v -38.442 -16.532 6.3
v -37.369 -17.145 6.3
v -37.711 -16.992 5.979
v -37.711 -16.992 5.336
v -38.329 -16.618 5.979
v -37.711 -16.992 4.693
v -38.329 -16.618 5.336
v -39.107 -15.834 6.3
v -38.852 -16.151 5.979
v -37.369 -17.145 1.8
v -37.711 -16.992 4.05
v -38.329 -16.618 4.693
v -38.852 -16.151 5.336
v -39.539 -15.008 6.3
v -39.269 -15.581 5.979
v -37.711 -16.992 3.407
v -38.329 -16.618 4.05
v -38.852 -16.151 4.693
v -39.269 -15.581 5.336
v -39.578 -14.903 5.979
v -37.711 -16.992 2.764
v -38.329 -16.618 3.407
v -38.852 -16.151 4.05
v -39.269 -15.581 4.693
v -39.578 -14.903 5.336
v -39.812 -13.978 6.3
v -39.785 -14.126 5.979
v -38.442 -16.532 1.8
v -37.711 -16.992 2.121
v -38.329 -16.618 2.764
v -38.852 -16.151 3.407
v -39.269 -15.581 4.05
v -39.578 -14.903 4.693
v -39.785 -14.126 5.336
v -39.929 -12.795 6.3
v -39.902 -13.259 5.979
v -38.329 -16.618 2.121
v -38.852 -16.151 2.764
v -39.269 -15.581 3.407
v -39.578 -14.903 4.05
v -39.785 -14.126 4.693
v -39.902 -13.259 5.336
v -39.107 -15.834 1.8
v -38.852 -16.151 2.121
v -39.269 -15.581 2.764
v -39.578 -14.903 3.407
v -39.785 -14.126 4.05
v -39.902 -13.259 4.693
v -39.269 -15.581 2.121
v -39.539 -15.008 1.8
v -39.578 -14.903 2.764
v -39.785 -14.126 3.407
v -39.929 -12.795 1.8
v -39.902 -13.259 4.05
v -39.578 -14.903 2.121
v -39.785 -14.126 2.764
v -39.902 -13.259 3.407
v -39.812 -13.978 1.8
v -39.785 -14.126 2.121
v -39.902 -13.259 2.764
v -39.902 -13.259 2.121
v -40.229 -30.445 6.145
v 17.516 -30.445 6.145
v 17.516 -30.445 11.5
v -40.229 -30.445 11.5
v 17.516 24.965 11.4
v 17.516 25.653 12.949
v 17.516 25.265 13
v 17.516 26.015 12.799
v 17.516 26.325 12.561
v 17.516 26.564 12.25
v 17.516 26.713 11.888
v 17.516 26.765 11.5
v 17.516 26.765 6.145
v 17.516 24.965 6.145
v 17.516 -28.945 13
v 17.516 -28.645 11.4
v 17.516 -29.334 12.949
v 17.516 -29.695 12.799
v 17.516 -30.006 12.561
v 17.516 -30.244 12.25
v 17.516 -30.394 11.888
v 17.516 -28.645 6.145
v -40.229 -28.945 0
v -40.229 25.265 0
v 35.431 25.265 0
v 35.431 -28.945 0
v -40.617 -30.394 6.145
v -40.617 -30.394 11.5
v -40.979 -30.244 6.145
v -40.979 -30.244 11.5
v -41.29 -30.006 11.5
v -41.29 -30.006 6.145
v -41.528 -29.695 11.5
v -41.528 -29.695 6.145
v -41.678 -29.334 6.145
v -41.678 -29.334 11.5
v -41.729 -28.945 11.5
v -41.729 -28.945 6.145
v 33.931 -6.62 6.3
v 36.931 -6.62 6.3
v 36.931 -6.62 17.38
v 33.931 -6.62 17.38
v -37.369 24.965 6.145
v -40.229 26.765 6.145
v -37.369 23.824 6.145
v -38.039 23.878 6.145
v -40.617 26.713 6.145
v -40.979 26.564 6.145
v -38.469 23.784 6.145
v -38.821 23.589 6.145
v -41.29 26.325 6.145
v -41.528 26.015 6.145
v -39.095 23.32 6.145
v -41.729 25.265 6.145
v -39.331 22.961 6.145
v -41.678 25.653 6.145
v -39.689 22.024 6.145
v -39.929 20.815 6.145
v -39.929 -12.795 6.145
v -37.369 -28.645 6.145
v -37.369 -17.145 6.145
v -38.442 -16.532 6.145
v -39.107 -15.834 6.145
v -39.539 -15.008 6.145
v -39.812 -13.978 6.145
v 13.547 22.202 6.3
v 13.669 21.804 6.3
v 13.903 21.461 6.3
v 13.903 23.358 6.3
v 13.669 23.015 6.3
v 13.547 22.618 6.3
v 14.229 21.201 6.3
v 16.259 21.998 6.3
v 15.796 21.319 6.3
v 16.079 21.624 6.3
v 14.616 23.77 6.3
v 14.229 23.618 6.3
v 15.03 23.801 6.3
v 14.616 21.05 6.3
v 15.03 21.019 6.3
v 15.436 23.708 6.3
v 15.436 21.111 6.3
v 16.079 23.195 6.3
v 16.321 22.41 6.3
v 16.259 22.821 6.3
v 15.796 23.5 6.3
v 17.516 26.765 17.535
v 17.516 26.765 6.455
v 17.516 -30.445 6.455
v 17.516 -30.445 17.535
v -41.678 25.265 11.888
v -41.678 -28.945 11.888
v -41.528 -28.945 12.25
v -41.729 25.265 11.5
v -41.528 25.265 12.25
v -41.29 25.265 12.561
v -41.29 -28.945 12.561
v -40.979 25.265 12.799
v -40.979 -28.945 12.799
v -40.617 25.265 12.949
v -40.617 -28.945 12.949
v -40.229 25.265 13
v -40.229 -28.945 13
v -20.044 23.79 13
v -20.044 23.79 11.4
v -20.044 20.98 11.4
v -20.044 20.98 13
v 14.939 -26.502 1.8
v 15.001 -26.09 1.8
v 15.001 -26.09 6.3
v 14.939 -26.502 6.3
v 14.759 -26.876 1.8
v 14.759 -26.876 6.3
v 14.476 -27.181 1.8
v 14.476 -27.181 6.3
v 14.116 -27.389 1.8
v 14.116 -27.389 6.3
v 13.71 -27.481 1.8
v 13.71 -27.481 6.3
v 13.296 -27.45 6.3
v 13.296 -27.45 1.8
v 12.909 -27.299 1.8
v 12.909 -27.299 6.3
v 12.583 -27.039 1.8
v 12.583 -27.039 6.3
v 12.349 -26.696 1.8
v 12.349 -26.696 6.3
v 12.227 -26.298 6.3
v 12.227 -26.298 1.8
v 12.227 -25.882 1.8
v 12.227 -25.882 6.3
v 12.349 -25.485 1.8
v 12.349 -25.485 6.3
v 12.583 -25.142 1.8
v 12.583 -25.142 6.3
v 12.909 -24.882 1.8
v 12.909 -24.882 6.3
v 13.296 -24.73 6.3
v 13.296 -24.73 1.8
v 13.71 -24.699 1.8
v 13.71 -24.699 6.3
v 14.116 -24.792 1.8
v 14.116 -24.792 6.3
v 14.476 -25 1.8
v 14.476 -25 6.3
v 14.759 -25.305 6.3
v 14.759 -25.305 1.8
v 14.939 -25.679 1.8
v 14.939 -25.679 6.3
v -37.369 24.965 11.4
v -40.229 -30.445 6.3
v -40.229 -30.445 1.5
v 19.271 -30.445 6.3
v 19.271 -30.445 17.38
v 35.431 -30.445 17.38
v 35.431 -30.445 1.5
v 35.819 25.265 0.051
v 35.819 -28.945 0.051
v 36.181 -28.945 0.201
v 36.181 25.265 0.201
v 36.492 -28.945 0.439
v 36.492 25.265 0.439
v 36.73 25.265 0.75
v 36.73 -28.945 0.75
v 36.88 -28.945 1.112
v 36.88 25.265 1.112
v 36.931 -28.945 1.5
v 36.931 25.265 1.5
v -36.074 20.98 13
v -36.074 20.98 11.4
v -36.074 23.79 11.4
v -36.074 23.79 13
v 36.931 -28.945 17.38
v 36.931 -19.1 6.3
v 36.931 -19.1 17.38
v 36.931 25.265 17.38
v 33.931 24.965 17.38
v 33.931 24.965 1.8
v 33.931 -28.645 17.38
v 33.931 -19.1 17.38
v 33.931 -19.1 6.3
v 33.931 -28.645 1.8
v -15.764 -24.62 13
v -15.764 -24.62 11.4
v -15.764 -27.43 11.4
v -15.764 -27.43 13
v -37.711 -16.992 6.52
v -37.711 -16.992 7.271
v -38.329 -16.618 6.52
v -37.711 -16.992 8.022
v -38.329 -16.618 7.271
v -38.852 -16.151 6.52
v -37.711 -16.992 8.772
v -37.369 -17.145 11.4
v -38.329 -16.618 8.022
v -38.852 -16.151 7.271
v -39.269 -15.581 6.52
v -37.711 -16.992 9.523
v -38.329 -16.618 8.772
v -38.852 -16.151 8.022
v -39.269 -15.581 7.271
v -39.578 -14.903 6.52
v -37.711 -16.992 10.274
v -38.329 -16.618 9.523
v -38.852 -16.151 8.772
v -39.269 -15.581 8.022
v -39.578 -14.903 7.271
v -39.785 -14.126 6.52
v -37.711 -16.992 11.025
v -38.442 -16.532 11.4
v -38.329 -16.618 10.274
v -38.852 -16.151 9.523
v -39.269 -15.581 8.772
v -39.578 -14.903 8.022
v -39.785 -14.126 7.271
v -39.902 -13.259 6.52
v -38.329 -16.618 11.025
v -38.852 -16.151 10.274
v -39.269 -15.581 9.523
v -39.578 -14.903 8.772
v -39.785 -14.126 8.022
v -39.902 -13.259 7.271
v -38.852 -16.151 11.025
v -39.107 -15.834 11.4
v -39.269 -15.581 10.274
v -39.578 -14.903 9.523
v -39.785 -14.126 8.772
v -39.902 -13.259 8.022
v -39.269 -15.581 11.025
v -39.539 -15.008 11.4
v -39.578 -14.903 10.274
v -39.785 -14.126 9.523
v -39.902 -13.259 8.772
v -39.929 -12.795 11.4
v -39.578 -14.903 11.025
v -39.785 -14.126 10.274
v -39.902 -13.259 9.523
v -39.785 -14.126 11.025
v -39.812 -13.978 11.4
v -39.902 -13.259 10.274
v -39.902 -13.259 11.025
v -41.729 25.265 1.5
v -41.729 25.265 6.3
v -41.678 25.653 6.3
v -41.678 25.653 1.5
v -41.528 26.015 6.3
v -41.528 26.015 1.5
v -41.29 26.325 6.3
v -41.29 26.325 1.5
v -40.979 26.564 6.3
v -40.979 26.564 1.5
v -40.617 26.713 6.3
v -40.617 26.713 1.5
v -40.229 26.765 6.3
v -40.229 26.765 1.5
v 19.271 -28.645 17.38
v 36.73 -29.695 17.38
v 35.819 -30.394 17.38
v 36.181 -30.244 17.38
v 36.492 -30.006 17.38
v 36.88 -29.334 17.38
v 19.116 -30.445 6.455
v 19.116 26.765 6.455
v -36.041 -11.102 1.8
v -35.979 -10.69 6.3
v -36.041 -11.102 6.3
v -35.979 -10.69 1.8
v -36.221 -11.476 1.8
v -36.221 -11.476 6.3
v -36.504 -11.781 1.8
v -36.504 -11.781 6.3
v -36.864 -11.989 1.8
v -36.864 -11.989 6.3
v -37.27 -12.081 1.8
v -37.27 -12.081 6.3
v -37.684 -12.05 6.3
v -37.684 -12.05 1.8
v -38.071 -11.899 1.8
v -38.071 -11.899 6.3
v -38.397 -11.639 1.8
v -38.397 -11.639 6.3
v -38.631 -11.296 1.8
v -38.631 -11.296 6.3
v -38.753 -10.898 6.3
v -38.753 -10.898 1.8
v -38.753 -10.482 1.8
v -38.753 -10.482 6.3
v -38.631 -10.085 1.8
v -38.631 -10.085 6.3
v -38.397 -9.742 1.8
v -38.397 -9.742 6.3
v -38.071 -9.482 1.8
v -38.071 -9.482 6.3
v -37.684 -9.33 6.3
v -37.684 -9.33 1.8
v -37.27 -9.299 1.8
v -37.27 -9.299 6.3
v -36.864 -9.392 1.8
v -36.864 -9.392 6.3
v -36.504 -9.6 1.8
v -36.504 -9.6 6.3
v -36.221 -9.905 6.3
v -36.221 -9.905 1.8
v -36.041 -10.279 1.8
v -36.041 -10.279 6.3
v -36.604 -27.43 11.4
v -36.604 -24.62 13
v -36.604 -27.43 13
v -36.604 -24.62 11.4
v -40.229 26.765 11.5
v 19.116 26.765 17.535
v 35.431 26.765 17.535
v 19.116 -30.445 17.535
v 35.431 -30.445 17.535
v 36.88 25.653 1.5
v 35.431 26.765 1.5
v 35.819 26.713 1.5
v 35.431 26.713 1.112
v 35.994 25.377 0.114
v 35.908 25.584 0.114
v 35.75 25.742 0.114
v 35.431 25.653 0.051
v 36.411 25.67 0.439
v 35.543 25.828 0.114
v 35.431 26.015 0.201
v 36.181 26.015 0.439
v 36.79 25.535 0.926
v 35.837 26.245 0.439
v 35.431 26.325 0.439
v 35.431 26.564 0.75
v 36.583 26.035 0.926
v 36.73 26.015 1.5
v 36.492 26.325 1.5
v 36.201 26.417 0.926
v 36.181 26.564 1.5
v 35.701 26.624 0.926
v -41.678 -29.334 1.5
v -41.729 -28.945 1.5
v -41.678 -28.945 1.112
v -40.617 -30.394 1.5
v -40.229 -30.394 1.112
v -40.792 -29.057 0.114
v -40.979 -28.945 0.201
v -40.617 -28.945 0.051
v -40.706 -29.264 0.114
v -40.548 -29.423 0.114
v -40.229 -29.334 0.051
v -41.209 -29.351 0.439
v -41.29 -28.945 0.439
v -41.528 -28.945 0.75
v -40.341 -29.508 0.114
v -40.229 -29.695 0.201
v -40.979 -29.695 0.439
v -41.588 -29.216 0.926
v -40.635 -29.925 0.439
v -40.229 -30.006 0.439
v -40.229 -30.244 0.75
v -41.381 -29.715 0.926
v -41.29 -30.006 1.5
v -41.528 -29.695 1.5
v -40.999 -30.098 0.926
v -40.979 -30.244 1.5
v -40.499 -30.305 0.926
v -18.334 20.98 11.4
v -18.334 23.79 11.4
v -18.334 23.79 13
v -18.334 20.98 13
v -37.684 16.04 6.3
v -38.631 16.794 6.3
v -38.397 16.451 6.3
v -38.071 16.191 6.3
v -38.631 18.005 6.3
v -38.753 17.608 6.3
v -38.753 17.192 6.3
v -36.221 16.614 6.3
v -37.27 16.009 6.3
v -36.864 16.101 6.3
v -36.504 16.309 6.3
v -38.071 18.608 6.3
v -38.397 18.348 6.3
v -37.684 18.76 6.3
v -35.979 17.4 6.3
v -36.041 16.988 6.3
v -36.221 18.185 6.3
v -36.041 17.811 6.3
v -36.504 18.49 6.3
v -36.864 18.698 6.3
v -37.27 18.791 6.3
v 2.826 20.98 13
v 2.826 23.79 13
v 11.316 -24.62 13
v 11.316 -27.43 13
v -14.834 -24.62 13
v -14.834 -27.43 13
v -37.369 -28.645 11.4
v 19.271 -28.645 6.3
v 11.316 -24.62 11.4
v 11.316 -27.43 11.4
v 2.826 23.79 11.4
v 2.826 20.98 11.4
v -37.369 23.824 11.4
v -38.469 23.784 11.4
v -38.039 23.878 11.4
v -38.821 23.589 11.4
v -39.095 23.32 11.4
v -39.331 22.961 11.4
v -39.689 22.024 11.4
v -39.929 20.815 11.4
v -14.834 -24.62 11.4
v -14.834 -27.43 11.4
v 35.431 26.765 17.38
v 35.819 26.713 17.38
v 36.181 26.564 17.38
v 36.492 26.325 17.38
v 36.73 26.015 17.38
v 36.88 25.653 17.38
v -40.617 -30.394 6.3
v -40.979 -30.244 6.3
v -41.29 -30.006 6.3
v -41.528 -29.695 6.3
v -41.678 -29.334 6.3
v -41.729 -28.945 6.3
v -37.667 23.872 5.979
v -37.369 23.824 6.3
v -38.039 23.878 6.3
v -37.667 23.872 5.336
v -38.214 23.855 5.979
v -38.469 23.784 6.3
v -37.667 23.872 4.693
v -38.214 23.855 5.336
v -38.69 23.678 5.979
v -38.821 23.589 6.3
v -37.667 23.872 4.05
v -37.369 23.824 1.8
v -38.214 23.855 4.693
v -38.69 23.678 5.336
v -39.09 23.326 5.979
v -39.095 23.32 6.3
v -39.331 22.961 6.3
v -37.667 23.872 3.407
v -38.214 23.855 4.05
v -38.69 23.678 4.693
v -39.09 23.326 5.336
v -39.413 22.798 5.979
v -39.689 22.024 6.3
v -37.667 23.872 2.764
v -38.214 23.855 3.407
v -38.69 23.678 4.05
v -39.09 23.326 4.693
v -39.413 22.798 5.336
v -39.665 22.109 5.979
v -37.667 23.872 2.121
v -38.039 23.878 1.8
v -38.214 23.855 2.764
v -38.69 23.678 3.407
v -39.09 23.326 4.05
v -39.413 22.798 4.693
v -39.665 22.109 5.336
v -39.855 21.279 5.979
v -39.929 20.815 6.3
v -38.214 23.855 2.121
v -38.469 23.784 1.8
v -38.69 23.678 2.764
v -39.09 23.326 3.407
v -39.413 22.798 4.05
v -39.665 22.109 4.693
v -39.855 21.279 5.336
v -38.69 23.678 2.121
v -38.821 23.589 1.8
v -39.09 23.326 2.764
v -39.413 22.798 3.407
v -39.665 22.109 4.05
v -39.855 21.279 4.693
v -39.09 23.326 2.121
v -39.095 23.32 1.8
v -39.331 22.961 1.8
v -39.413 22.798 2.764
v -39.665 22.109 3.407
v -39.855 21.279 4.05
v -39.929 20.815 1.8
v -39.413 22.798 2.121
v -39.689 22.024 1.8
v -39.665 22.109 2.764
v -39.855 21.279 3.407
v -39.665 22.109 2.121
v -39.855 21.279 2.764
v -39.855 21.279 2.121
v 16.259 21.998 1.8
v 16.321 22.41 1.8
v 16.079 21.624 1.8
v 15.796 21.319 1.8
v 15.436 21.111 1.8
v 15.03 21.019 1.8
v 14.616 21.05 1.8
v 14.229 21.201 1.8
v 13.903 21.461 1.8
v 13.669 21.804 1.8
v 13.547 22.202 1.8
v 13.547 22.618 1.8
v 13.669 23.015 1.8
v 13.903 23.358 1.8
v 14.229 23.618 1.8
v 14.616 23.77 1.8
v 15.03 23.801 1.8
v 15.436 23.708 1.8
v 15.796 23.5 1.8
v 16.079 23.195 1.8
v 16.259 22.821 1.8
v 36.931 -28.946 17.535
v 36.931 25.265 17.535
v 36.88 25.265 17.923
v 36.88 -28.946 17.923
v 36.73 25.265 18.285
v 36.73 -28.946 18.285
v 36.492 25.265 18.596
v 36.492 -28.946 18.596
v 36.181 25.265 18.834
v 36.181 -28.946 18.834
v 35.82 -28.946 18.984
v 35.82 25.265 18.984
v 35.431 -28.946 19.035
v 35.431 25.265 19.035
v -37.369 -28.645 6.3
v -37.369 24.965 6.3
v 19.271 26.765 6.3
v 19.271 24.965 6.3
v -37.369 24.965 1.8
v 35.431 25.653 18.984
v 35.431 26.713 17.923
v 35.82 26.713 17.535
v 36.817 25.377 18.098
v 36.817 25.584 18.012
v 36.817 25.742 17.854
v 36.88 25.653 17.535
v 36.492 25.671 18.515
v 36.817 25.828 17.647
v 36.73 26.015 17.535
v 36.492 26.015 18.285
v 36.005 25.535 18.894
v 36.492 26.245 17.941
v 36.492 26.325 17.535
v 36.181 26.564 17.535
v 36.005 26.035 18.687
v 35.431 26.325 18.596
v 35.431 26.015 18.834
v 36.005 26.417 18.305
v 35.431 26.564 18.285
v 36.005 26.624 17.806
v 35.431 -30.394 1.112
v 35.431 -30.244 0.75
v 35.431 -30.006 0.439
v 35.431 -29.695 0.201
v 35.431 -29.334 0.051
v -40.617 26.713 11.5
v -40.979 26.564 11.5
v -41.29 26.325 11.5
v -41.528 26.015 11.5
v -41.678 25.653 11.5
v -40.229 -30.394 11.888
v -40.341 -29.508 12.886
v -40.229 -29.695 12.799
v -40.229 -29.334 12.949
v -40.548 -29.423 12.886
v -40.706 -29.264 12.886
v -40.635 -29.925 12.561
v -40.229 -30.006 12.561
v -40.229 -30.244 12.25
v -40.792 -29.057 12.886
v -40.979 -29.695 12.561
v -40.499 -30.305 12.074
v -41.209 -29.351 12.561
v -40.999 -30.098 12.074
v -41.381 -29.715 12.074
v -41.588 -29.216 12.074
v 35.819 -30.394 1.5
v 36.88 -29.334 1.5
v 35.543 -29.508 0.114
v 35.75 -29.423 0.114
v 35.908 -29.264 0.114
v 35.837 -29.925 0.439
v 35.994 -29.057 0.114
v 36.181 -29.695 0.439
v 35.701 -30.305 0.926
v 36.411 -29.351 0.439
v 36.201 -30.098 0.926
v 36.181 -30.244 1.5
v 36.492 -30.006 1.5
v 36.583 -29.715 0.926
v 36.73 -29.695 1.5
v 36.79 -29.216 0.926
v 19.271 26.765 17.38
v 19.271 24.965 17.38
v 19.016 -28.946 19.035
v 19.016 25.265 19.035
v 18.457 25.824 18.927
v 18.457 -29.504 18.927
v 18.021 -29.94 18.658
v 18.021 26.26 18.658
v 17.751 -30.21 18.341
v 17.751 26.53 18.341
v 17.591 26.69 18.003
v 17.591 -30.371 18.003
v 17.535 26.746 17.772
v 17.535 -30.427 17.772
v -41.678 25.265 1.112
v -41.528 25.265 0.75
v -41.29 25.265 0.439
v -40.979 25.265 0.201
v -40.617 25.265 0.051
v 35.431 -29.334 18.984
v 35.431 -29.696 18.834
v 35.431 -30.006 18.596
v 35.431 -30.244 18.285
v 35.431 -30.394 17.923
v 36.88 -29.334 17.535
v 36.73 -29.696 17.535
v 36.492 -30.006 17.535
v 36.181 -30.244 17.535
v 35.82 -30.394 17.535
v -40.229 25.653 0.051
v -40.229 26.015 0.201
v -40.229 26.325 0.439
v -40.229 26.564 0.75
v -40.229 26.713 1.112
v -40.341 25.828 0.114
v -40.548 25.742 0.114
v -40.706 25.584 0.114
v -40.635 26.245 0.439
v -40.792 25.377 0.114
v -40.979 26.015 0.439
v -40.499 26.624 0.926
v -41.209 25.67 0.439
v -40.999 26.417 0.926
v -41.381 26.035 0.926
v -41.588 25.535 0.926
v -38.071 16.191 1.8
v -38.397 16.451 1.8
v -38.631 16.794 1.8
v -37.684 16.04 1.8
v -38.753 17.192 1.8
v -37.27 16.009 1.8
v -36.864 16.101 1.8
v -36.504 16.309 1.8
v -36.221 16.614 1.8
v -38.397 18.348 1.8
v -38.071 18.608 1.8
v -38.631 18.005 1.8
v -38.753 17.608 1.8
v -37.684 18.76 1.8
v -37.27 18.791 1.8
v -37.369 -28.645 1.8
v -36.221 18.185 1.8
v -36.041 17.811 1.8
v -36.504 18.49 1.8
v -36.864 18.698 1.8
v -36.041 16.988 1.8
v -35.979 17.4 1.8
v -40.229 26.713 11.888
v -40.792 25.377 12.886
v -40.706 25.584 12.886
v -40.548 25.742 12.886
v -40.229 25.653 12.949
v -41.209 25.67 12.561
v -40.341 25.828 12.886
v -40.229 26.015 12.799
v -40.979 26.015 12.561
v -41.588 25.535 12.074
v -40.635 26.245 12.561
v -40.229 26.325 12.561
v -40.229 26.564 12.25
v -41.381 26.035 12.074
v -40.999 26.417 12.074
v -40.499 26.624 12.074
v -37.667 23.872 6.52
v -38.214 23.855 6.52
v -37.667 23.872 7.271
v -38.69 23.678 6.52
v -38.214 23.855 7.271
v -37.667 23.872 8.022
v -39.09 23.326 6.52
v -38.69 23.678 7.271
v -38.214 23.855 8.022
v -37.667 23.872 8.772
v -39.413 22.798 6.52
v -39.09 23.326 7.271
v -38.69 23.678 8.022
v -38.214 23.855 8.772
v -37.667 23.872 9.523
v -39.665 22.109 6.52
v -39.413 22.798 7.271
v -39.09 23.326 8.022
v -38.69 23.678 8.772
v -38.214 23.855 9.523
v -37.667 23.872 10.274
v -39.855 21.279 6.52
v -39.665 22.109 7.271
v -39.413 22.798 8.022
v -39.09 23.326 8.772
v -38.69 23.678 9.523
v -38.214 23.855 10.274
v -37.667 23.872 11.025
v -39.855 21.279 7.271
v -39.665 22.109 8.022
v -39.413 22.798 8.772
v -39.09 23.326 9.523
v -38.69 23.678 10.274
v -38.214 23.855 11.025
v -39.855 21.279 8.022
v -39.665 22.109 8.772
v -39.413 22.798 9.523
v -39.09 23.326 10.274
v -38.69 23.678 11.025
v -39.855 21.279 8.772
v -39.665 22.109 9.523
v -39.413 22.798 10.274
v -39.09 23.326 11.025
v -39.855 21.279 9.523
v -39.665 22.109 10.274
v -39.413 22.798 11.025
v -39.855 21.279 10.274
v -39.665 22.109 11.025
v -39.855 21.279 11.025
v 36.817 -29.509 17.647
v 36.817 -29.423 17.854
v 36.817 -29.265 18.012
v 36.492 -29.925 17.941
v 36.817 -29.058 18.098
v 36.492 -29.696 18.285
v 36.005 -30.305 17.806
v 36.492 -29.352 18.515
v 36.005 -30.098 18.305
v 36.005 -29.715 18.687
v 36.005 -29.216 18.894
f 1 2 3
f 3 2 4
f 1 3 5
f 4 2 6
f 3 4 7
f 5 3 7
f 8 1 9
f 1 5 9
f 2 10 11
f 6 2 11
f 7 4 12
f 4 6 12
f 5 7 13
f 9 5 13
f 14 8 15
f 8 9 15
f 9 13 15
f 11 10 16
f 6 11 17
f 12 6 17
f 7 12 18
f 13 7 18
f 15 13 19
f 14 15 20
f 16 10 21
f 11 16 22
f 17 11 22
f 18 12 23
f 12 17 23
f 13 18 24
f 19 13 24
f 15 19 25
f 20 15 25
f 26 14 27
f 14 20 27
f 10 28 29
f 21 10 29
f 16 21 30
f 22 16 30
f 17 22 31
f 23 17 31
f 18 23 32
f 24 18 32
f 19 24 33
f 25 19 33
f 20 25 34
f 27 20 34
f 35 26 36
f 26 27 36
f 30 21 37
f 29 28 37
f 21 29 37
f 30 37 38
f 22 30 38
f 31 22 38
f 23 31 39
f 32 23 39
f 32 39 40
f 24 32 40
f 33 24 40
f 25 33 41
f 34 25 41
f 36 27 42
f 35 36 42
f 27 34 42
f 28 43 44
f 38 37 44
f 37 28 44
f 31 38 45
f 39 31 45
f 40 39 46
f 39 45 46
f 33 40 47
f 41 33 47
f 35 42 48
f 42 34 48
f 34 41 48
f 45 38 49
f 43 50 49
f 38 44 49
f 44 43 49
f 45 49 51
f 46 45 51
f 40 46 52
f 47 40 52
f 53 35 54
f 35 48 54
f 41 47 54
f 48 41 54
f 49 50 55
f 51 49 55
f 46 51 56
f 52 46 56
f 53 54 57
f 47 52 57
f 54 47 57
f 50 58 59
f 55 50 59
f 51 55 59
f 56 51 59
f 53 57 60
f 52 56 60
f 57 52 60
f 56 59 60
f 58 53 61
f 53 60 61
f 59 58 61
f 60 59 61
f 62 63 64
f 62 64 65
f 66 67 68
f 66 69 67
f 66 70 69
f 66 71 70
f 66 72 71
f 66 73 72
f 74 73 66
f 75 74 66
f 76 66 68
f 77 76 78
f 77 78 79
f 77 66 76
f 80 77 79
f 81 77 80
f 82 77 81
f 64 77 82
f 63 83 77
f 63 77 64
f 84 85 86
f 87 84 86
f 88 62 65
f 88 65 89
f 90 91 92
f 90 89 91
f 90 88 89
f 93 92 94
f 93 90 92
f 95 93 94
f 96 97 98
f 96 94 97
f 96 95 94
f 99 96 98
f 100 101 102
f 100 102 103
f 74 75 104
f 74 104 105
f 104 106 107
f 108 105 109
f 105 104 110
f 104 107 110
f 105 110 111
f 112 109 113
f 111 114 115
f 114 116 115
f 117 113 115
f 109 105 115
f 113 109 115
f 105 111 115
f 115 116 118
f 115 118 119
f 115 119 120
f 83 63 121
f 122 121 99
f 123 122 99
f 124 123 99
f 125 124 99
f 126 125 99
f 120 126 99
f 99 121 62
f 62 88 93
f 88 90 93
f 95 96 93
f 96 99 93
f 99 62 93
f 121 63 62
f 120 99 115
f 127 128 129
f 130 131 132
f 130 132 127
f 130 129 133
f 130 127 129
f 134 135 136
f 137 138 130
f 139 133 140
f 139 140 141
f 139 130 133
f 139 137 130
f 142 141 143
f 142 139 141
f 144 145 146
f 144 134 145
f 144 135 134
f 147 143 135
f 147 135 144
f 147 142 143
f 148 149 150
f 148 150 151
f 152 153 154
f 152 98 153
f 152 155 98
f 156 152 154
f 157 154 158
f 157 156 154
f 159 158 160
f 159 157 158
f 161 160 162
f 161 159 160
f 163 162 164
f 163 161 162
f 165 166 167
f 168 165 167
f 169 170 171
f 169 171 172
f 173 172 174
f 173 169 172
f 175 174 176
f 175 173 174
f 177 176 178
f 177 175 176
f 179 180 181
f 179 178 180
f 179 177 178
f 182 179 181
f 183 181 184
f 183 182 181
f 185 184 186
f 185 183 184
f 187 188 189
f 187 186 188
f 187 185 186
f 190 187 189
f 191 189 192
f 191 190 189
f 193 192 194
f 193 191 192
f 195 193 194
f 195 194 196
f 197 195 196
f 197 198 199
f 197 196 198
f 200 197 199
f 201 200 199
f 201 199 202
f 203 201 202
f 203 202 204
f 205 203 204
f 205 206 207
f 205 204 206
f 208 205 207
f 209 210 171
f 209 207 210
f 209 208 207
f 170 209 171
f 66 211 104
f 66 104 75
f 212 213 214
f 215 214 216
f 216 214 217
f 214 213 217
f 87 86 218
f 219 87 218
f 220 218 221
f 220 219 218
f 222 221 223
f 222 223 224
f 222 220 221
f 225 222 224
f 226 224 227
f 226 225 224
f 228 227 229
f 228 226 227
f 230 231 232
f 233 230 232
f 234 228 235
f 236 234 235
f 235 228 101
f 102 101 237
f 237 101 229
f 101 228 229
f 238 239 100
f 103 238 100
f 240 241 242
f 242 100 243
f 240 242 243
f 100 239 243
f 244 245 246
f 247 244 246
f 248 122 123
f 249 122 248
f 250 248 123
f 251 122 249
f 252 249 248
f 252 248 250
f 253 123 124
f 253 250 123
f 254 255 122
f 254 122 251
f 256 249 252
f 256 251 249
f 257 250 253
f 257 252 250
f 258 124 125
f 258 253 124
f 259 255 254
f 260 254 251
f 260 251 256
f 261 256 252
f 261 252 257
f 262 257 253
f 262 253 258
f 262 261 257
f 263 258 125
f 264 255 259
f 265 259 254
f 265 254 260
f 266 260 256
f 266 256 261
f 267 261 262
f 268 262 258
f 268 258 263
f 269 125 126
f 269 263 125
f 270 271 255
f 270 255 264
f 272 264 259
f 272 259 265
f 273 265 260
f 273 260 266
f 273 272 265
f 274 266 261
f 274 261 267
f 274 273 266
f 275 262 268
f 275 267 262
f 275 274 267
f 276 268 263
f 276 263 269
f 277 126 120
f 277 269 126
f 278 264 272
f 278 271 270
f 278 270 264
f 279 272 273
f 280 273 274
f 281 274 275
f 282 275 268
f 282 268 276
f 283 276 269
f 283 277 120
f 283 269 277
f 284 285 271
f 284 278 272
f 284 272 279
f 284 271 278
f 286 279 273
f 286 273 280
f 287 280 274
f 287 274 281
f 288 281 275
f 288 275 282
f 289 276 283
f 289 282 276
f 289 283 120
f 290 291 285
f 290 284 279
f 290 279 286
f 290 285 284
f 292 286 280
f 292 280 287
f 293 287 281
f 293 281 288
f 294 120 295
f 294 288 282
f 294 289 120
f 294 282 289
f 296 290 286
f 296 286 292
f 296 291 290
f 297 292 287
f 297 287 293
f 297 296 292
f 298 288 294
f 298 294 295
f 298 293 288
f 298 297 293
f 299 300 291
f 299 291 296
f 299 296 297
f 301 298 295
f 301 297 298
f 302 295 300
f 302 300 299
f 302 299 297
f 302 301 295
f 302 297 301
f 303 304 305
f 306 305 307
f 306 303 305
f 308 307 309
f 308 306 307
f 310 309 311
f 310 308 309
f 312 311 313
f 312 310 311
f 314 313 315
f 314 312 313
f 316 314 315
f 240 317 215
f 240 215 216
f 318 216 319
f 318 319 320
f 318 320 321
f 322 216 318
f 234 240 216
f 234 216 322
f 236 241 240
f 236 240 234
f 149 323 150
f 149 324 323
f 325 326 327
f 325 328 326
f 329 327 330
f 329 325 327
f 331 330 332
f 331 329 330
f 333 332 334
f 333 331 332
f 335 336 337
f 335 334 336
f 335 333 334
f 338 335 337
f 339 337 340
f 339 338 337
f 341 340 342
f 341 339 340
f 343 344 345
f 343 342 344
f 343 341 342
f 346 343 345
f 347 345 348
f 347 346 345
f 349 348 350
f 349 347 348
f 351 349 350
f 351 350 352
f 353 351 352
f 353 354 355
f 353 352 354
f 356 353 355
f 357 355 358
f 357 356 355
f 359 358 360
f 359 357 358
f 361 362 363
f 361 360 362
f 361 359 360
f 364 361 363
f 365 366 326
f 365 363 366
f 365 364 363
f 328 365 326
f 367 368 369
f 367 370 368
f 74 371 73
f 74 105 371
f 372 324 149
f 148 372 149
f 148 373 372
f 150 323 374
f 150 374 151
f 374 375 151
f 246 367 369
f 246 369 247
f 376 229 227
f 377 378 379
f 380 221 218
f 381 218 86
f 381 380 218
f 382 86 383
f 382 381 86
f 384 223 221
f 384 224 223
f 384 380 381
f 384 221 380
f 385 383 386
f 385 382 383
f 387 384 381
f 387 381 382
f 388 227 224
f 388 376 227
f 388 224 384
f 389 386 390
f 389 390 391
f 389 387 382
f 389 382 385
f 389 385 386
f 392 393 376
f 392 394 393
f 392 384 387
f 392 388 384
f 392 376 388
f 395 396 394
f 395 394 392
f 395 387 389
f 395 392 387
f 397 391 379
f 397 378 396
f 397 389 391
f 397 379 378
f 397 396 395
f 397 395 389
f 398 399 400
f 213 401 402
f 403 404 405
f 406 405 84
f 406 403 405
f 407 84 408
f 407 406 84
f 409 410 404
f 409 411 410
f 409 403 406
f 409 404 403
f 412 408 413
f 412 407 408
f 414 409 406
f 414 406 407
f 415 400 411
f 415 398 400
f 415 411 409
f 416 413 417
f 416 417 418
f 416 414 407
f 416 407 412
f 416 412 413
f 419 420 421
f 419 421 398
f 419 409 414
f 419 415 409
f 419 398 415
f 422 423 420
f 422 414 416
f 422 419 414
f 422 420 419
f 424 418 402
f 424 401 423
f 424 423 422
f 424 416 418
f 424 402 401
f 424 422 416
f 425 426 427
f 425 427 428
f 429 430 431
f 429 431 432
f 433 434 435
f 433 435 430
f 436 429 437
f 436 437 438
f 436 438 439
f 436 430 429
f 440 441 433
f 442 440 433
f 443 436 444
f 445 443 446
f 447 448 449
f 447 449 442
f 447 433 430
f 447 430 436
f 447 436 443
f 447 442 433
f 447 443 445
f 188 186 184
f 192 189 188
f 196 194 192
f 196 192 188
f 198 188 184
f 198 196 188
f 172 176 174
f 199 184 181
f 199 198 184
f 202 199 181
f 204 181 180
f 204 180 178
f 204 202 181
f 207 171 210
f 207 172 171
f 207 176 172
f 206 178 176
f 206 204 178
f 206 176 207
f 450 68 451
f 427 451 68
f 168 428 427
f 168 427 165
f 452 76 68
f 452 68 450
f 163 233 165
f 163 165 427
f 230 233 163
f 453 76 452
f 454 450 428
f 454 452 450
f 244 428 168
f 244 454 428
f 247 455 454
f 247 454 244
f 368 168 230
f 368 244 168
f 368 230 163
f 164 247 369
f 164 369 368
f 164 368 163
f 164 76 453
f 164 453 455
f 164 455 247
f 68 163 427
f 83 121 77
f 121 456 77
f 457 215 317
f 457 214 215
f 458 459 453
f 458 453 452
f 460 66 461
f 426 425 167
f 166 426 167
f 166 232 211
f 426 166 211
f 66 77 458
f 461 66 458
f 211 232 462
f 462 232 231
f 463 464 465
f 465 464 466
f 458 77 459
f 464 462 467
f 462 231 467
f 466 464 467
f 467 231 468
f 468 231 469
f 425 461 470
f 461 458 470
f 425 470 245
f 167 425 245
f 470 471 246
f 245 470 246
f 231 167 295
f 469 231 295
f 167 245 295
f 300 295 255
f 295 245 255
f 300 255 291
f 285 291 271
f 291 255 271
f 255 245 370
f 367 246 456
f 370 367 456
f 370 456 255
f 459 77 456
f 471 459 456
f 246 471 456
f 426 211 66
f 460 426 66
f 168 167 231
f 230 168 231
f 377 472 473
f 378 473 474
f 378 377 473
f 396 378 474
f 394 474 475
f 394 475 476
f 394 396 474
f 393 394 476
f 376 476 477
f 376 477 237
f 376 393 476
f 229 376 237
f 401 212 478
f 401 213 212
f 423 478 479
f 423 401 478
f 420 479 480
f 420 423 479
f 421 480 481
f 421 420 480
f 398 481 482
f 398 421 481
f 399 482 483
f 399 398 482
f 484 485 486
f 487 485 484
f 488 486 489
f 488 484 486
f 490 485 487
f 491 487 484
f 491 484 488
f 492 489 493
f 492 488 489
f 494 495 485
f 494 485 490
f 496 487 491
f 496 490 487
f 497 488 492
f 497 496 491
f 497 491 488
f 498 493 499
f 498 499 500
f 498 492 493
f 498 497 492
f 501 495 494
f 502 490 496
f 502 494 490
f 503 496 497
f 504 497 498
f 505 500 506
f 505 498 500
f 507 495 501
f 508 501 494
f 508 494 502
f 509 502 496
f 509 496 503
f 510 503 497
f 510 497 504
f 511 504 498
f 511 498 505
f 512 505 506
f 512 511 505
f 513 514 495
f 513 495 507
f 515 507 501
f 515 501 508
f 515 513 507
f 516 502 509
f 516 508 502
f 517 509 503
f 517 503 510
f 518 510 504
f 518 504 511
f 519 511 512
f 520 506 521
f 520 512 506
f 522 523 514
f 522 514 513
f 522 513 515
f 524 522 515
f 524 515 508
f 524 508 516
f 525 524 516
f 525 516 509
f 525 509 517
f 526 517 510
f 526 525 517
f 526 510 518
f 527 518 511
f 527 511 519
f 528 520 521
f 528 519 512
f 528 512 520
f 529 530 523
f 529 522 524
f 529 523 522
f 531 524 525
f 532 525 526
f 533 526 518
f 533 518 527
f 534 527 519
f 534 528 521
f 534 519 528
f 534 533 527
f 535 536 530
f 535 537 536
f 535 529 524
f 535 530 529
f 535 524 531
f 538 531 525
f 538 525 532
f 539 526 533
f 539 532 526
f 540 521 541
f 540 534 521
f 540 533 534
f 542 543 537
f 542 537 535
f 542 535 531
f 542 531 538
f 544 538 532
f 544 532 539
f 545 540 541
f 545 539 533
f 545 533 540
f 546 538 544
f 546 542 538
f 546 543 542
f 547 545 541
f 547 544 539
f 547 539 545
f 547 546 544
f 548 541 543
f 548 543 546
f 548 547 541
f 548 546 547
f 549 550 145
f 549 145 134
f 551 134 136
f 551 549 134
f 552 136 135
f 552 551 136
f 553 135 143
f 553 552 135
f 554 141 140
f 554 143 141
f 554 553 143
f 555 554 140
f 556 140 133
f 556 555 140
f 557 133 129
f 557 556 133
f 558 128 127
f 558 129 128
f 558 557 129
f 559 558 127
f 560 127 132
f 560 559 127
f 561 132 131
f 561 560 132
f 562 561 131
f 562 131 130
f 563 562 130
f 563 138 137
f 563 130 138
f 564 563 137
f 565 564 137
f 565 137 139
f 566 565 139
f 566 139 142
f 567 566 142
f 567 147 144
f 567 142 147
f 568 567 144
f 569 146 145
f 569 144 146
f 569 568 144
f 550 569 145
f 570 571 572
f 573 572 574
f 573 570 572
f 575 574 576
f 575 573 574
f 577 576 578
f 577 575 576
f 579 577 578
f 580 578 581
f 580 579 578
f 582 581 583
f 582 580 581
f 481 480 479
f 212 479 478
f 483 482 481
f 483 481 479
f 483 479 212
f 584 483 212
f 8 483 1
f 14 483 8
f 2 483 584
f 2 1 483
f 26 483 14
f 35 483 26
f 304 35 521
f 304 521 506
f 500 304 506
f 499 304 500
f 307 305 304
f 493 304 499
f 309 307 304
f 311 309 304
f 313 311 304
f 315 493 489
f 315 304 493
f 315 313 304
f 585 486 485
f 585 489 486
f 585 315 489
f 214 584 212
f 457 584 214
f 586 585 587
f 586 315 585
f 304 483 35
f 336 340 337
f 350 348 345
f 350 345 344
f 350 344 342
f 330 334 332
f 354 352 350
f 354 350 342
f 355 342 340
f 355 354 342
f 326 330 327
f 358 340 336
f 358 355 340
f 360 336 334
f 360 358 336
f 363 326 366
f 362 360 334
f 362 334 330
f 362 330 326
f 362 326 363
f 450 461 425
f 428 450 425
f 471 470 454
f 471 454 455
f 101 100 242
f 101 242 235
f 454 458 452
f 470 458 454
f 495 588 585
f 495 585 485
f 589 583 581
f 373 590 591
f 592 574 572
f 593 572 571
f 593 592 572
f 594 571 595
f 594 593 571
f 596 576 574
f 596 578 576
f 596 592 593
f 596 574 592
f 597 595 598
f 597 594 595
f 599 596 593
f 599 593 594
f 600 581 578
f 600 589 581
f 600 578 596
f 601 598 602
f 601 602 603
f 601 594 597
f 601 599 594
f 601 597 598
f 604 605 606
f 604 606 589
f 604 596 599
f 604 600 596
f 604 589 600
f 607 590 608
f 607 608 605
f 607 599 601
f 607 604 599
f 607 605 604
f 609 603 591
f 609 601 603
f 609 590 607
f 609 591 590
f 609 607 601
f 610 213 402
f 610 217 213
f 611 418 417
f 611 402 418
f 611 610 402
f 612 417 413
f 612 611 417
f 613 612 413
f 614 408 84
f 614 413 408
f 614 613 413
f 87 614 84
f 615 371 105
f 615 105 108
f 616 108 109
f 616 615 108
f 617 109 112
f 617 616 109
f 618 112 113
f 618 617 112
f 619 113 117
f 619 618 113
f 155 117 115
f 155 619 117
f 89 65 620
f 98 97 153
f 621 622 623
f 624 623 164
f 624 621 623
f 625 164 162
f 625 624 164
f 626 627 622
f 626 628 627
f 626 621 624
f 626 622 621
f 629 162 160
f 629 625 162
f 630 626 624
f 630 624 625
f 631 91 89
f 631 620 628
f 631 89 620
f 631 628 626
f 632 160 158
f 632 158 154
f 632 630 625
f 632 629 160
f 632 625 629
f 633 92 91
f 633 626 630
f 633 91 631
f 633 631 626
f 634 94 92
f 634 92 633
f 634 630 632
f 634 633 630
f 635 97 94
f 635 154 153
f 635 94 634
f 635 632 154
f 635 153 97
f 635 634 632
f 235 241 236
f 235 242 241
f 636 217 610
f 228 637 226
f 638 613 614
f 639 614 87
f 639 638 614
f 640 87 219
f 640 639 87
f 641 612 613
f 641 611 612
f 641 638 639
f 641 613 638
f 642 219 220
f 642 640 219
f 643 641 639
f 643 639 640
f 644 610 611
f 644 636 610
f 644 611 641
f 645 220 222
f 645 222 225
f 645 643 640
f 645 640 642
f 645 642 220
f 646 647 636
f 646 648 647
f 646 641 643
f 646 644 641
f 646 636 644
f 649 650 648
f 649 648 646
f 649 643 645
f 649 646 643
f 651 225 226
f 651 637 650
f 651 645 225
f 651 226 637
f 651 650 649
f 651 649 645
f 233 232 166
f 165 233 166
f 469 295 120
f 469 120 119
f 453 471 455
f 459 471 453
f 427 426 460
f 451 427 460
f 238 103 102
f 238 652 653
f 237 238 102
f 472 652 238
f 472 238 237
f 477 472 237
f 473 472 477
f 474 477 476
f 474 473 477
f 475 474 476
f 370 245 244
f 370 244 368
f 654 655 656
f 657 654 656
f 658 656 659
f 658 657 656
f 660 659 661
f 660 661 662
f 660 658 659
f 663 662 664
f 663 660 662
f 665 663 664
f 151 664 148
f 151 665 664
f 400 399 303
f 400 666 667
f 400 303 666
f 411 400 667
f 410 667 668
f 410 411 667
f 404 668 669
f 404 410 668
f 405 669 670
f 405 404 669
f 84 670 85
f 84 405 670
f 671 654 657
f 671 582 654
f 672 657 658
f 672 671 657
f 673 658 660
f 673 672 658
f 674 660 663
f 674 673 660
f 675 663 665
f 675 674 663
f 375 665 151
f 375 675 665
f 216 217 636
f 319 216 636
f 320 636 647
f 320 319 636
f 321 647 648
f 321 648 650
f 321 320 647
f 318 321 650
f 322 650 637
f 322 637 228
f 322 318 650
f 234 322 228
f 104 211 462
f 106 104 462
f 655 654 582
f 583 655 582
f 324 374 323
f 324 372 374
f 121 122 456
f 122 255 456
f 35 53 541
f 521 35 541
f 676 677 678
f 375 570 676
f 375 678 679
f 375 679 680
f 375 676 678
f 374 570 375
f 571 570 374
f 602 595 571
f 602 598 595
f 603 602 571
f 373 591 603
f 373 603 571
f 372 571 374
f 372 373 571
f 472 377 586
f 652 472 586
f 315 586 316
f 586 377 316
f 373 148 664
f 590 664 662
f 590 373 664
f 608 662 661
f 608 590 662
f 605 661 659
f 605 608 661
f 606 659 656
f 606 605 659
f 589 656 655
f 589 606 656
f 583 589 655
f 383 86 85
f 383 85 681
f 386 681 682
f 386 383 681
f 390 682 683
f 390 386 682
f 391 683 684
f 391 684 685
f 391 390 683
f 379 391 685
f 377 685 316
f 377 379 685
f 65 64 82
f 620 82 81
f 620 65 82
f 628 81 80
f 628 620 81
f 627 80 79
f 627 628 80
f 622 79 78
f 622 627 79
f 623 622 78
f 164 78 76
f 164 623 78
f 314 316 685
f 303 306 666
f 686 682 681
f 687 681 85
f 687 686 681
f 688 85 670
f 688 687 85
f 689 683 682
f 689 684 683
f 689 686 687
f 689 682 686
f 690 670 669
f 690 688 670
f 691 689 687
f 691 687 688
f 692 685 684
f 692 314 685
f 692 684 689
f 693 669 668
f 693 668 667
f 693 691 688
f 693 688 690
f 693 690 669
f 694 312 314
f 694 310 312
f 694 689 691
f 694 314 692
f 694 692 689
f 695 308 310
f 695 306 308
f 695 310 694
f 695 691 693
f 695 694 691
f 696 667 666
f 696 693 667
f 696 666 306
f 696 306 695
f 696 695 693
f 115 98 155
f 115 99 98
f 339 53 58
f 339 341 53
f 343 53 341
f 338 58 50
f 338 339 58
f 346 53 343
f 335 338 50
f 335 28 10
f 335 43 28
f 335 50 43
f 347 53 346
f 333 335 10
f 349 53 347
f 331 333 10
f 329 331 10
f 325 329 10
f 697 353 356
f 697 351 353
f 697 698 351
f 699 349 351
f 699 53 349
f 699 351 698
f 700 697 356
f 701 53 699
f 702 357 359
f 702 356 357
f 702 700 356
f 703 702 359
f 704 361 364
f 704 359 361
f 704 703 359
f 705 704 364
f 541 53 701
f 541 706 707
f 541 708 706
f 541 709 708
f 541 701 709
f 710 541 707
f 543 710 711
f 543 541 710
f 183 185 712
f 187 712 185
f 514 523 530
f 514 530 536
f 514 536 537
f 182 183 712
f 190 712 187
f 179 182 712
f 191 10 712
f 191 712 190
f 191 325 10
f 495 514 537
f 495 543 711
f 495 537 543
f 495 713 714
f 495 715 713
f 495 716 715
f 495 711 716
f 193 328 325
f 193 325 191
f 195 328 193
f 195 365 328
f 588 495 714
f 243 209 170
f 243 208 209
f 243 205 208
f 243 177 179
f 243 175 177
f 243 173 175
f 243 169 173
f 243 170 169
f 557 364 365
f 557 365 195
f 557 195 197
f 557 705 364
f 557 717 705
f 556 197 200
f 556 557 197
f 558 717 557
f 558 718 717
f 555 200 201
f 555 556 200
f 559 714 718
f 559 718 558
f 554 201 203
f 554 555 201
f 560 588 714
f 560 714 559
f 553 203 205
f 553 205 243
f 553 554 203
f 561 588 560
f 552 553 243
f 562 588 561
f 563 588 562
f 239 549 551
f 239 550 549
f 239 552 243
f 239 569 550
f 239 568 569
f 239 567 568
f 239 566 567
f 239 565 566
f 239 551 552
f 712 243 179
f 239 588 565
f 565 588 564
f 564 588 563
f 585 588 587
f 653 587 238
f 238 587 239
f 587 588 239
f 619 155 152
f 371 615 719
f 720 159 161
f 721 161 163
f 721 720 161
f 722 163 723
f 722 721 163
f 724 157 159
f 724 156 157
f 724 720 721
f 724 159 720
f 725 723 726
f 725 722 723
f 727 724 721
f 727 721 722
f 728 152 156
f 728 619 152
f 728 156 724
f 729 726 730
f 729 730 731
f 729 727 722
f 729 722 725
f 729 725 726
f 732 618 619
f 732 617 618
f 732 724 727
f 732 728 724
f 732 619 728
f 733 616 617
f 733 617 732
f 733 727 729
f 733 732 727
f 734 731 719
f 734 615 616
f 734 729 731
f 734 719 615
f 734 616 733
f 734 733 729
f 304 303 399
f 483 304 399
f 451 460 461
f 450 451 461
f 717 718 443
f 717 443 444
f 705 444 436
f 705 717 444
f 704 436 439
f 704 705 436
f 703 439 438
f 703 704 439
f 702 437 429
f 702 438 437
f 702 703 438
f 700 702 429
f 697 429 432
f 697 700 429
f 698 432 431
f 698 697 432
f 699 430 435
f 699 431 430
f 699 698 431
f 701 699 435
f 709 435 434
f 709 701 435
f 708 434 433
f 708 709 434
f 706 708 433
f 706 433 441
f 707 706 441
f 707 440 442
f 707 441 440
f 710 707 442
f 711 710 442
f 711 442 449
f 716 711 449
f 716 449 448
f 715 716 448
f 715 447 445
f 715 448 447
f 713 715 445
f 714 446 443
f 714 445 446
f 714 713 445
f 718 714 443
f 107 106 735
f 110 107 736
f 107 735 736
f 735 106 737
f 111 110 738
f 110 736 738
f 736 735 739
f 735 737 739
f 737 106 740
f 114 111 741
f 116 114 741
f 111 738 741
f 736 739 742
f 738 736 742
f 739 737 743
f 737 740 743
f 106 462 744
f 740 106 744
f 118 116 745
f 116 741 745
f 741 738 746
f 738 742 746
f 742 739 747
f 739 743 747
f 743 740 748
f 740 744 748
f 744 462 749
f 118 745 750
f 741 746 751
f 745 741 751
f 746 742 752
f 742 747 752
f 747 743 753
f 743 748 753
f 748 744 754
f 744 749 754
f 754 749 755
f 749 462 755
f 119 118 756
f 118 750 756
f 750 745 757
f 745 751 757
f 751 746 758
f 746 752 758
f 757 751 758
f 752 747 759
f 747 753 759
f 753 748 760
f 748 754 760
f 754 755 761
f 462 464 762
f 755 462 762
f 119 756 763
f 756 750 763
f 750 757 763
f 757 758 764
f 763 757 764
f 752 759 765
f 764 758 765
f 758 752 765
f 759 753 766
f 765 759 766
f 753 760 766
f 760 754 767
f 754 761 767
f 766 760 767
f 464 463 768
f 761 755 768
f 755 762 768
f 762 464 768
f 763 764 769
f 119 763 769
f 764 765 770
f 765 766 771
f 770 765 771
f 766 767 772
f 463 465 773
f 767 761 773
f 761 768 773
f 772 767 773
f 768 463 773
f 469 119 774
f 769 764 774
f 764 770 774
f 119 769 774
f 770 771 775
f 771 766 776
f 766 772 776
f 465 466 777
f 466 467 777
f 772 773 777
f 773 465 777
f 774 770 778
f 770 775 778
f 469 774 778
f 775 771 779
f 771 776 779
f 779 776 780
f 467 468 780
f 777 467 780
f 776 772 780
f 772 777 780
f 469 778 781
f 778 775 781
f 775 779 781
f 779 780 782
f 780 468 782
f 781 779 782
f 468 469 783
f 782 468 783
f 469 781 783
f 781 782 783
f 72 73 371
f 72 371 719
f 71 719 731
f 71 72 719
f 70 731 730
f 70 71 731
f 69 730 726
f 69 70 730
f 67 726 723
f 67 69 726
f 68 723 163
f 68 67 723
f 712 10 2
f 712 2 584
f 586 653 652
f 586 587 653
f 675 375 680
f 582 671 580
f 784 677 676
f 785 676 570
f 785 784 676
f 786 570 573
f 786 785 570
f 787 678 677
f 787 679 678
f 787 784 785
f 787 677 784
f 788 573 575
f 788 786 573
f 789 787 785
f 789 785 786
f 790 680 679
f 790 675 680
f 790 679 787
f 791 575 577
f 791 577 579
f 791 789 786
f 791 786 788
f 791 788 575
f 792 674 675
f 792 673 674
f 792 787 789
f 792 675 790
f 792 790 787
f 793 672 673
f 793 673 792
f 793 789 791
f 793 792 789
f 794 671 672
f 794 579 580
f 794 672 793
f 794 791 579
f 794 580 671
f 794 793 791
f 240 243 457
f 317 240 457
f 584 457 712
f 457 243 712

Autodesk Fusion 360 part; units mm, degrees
sketch "Footprint" plane through (0, 0, 0) normal (0, 0, 1) x (1, 0, 0) in component "Box"
  line L0 (-37.3689, 24.9646) -> (33.9311, 24.9646)
  line L1 (33.9311, 24.9646) -> (33.9311, -28.6454)
  line L2 (33.9311, -28.6454) -> (-37.3689, -28.6454)
  line L3 (-39.9289, -28.6454) -> (-39.9289, 24.9646) construction
  line L4 (-37.3689, 24.9646) -> (-37.3689, 23.8242)
  line L5 (-37.3689, -17.1454) -> (-37.3689, -28.6454)
  line L6 (-39.9289, -12.7954) -> (-39.9289, 20.8146)
  line L7 (-37.3689, -28.6454) -> (-39.9289, -28.6454) construction
  line L8 (-37.3689, 24.9646) -> (-39.9289, 24.9646) construction
  spline S0 degree 5 poles (-37.3689, -17.1454) (-37.4677, -17.1053) (-37.6612, -17.0209) (-37.9387, -16.8819) (-38.2829, -16.671) (-38.6672, -16.3623) (-39.0017, -16.0045) (-39.2827, -15.5942) (-39.5091, -15.13) (-39.6839, -14.6151) (-39.8112, -14.0534) (-39.8784, -13.57) (-39.9106, -13.1896) (-39.9241, -12.9281) (-39.9289, -12.7954) knots 0 0 0 0 0 0 0.1 0.2 0.3 0.4 0.5 0.6 0.7 0.8 0.9 1 1 1 1 1 1
  spline S1 degree 5 poles (-37.3689, 23.8242) (-37.4546, 23.8427) (-37.6228, 23.8724) (-37.8658, 23.8956) (-38.1706, 23.8828) (-38.5177, 23.7895) (-38.8283, 23.6128) (-39.1, 23.3478) (-39.3331, 22.9945) (-39.5301, 22.5591) (-39.6944, 22.0491) (-39.802, 21.5868) (-39.8702, 21.2116) (-39.9102, 20.949) (-39.9289, 20.8146) knots 0 0 0 0 0 0 0.1 0.2 0.3 0.4 0.5 0.6 0.7 0.8 0.9 1 1 1 1 1 1
  circle A0 centre (-37.3739, -10.6904) radius 1.395
  circle A1 centre (-37.3739, 17.3996) radius 1.395
  circle A2 centre (14.9261, 22.4096) radius 1.395
  circle A3 centre (13.6061, -26.0904) radius 1.395
  line L9 (33.9311, 24.9646) -> (36.9311, 24.9646)
  line L10 (36.9311, 24.9646) -> (36.9311, -28.6454)
  line L11 (36.9311, -28.6454) -> (33.9311, -28.6454)
  line L12 (36.9311, 24.9646) -> (36.9311, 26.7646)
  line L13 (36.9311, 26.7646) -> (-41.7289, 26.7646)
  line L14 (-41.7289, 26.7646) -> (-41.7289, -30.4454)
  line L15 (-41.7289, -30.4454) -> (36.9311, -30.4454)
  line L16 (36.9311, -30.4454) -> (36.9311, -28.6454)
  line L17 (33.9311, -19.1004) -> (36.9311, -19.1004)
  line L18 (36.9311, -6.6204) -> (33.9311, -6.6204)
  line L19 (19.2711, -30.4454) -> (19.2711, -28.6454)
  line L20 (19.2711, 24.9646) -> (19.2711, 26.7646)
  point P0 (-39.2184, -15.6652)
  point P1 (-38.9763, 23.4524)
  dimension "d4" = 53.61
  dimension "d6" = 73.86
  dimension "d8" = 2.56
  dimension "d10" = 33.61
  dimension "d12" = 15.85
  dimension "d14" = 2.79
  dimension "d15" = 17.955
  dimension "d16" = 2.555
  dimension "d17" = 7.565
  dimension "d18" = 2.555
  dimension "d19" = 2.555
  dimension "d20" = 20.325
  dimension "d21" = 19.005
  dimension "d22" = 3
  dimension "d23" = 1.8
  dimension "d24" = 1.8
  dimension "d25" = 1.8
  dimension "d31" = 9.545
  dimension "d32" = 12.48
  dimension "d38" = 14.66
  dimension "d47" = 11.5
extrude "Extrude1" add sketch "Footprint" along normal blind 1.8 contours L0 L2 L4 L5 L6 S0 S1 L13 L14 L15 L19 L20 | L0 L1 L2 L4 L5 L6 S0 S1 | L0 L9 L12 L13 L20 | L1 L9 L10 L18 | L1 L10 L17 L18 | L1 L10 L11 L17 | L2 L11 L15 L16 L19 | A0 | A1 | A2 | A3 makes body 1 in component "Box"
extrude "Extrude2" add sketch "Footprint" along normal blind 4.5 from surface at 1.8 contours L0 L2 L4 L5 L6 S0 S1 L13 L14 L15 L19 L20 | L0 L9 L12 L13 L20 | L1 L9 L10 L18 | L1 L10 L17 L18 | L1 L10 L11 L17 | L2 L11 L15 L16 L19 | A0 | A1 | A2 | A3 bodies 1 in component "Box"
extrude "Extrude3" add sketch "Footprint" along normal blind 11.08 from surface at 6.3 contours L0 L9 L12 L13 L20 | L1 L9 L10 L18 | L1 L10 L11 L17 | L2 L11 L15 L16 L19 bodies 1 in component "Box"
sketch "Side Profile" plane through (0, 26.7646, 0) normal (0, 1, 0) x (-1, 0, 0) in component "FrontCover"
  line L0 (-19.2711, 6.3) -> (-19.2711, 17.38) construction
  line L1 (-36.9311, 17.38) -> (-19.2711, 17.38) construction
  line L2 (-36.9311, 17.535) -> (-19.1161, 17.535)
  line L3 (-19.1161, 17.535) -> (-19.1161, 6.455)
  line L4 (-19.1161, 6.455) -> (-17.5161, 6.455)
  line L5 (-17.5161, 6.455) -> (-17.5161, 19.035)
  line L6 (-17.5161, 19.035) -> (-36.9311, 19.035)
  line L7 (-36.9311, 19.035) -> (-36.9311, 17.535)
  dimension "d39" = 0.155
  dimension "d40" = 0.155
  dimension "d44" = 0.155
  dimension "d45" = 1.5
  dimension "d46" = 1.6
extrude "Extrude1'" add sketch "Side Profile" against normal up to surface (57.21 mm away) separate body makes body 2 in component "FrontCover"
ref_plane "WorkPlane1" through (-11.2289, -1.8404, 11.4) normal (0, 0, 1) x (1, 0, 0) in component "Lid"
sketch "Footprint (2)" plane through (0, 0, 11.4) normal (0, 0, 1) x (-1, 0, 0) in component "Lid"
  line L0 (-33.9311, 28.6454) -> (37.3689, 28.6454) construction
  line L1 (37.3689, 17.1454) -> (37.3689, 28.6454)
  spline S0 degree 5 poles (37.3689, 17.1454) (37.4677, 17.1053) (37.6612, 17.0209) (37.9387, 16.8819) (38.2829, 16.671) (38.6672, 16.3623) (39.0017, 16.0045) (39.2827, 15.5942) (39.5091, 15.13) (39.6839, 14.6151) (39.8112, 14.0534) (39.8784, 13.57) (39.9106, 13.1896) (39.9241, 12.9281) (39.9289, 12.7954) knots 0 0 0 0 0 0 0.1 0.2 0.3 0.4 0.5 0.6 0.7 0.8 0.9 1 1 1 1 1 1
  line L2 (39.9289, 12.7954) -> (39.9289, -20.8146)
  spline S1 degree 5 poles (37.3689, -23.8242) (37.4546, -23.8427) (37.6228, -23.8724) (37.8658, -23.8956) (38.1706, -23.8828) (38.5177, -23.7895) (38.8283, -23.6128) (39.1, -23.3478) (39.3331, -22.9945) (39.5301, -22.5591) (39.6944, -22.0491) (39.802, -21.5868) (39.8702, -21.2116) (39.9102, -20.949) (39.9289, -20.8146) knots 0 0 0 0 0 0 0.1 0.2 0.3 0.4 0.5 0.6 0.7 0.8 0.9 1 1 1 1 1 1
  line L3 (37.3689, -24.9646) -> (37.3689, -23.8242)
  line L4 (37.3689, -24.9646) -> (-33.9311, -24.9646) construction
  line L5 (41.7289, -26.7646) -> (-17.5161, -26.7646)
  line L6 (-17.5161, -26.7646) -> (-17.5161, -24.9646)
  line L7 (37.3689, -24.9646) -> (-17.5161, -24.9646)
  line L8 (37.3689, 28.6454) -> (-17.5161, 28.6454)
  line L9 (-17.5161, 30.4454) -> (-17.5161, 28.6454)
  line L10 (-17.5161, 30.4454) -> (41.7289, 30.4454)
  line L11 (41.7289, 30.4454) -> (41.7289, -26.7646)
  line L12 (-17.5161, -24.9646) -> (-17.5161, 28.6454)
  line L13 (36.6039, 27.4304) -> (-11.3161, 27.4304)
  line L14 (-11.3161, 27.4304) -> (-11.3161, 24.6204)
  line L15 (-11.3161, 24.6204) -> (36.6039, 24.6204)
  line L16 (36.6039, 24.6204) -> (36.6039, 27.4304)
  line L17 (36.0739, -23.7896) -> (-2.8261, -23.7896)
  line L18 (-2.8261, -23.7896) -> (-2.8261, -20.9796)
  line L19 (-2.8261, -20.9796) -> (36.0739, -20.9796)
  line L20 (36.0739, -20.9796) -> (36.0739, -23.7896)
  line L21 (15.7639, 24.6204) -> (15.7639, 27.4304)
  line L22 (14.8339, 24.6204) -> (14.8339, 27.4304)
  line L23 (20.0439, -23.7896) -> (20.0439, -20.9796)
  line L24 (18.3339, -23.7896) -> (18.3339, -20.9796)
  point P0 (41.7289, -26.7646)
  point P1 (-19.2711, -26.7646)
  point P2 (-19.2711, 30.4454)
  point P3 (41.7289, 30.4454)
  dimension "d48" = 1.755
  dimension "d58" = 0.765
  dimension "d59" = 2.81
  dimension "d60" = 20.84
  dimension "d61" = 0.93
  dimension "d62" = 26.15
  dimension "d63" = 1.215
  dimension "d64" = 1.295
  dimension "d65" = 16.03
  dimension "d66" = 1.71
  dimension "d67" = 21.16
  dimension "d68" = 2.81
  dimension "d69" = 1.175
extrude "Extrude1''" add sketch "Footprint (2)" along normal blind 1.6 separate body contours L1 S0 L2 S1 L3 L7 L8 L12 | L1 S0 L2 S1 L3 L5 L6 L7 L8 L9 L10 L11 | L13 L15 L21 L22 | L17 L19 L23 L24 makes body 3 in component "Lid"
extrude "Extrude2'" add sketch "Footprint (2)" against normal up to surface (5.255 mm away) contours L1 S0 L2 S1 L3 L5 L6 L7 L8 L9 L10 L11 bodies 3 in component "Lid"
fillet "Fillet1" radius 1.5 4 edges at (-41.7289, 26.7646, 3.15) (36.9311, 26.7646, 8.69) (36.9311, -30.4454, 8.69) (-41.7289, -30.4454, 3.15) 1 faces at (-15.5089, 7.6946, 0) on bodies 1 in component "Box"
fillet "Fillet1'" radius 1.5 6 edges at (27.2236, 26.7646, 19.035) (36.9311, 26.7646, 18.285) (27.2236, -30.4454, 19.035) (36.9311, -30.4454, 18.285) (17.5161, -1.8404, 19.035) (36.9311, -1.8404, 19.035) on bodies 2 in component "FrontCover"
fillet "Fillet1''" radius 1.5 5 edges at (-41.7289, 26.7646, 9.5725) (-41.7289, -30.4454, 9.5725) (-41.7289, -1.8404, 13) (-12.1064, -30.4454, 13) (-12.1064, 26.7646, 13) on bodies 3 in component "Lid"
component "Box" placed x (1, 0, 0) y (0, 1, 0) z (0, 0, 1) at (0, 0, 0)
component "FrontCover" placed x (1, 0, 0) y (0, 1, 0) z (0, 0, 1) at (0, 0, 0)
component "Lid" placed x (1, 0, 0) y (0, 1, 0) z (0, 0, 1) at (0, 0, 0)
equation "Tolerance = 0.17 mm" comment "Tolerance to use when PLA/PETG parts mate with existing parts (like a a screw), or when you a very small amount of clearance at mating site."
equation "Tolerance_Tight = 0.155 mm" comment "Tolerance to use when you want the parts to make contact at mating site."
equation "Tolerance_PressFitLight = 0.12 mm" comment "Tolerance to use when you want the parts to press fit together, like Legos."
equation "d4 = Arduino_Width + 2 * Tolerance_Tight"
equation "Arduino_Width = 53.3 mm"
equation "d6 = Arduino_Length + 2 * Tolerance_Tight"
equation "Arduino_Length = 73.55 mm"
equation "d10 = Arduino_BackBumpLength + 2 * Tolerance_Tight"
equation "Arduino_BackBumpLength = 33.3 mm"
equation "Arduino_MountingHoleDiameter = 3.1 mm"
equation "d14 = Arduino_MountingHoleDiameter - 2 * Tolerance_Tight"
equation "d15 = 2 * Tolerance_Tight + d14 / 2 + 16.25 mm"
equation "d16 = 0.85 mm + d14 / 2 + 2 * Tolerance_Tight"
equation "d17 = 2 * Tolerance_Tight + 5.86 mm + d14 / 2"
equation "d18 = d16"
equation "d19 = d16"
equation "d20 = 2 * Tolerance_Tight + 18.62 mm + d14 / 2"
equation "d21 = 2 * Tolerance_Tight + 17.3 mm + d14 / 2"
equation "d24 = d23"
equation "d25 = d23"
equation "d26 = d23"
equation "d31 = 9.7 mm - Tolerance_Tight"
equation "d32 = Arduino_UsbPortWidth + 2 * Tolerance_Tight"
equation "Arduino_UsbPortHeight = 10.77 mm"
equation "Arduino_UsbPortWidth = 12.17 mm"
equation "d36 = Arduino_UsbPortHeight + 2 * Tolerance_Tight"
equation "d39 = Tolerance_Tight"
equation "d40 = d39"
equation "d44 = d39"
equation "d48 = d46 + Tolerance_Tight"
equation "Arduino_LidHeight = 5.1 mm"
equation "d50 = Arduino_LidHeight"
equation "d53 = -Tolerance_Tight"
equation "d55 = 1.5 mm"
equation "d56 = d55"
equation "d57 = d55"
equation "d58 = 0.92 mm - Tolerance_Tight"
equation "d59 = 2.5 mm + 2 * Tolerance_Tight"
equation "d60 = 20.53 mm + 2 * Tolerance_Tight"
equation "d61 = 1.24 mm - 2 * Tolerance_Tight"
equation "d62 = 25.84 mm + 2 * Tolerance_Tight"
equation "d63 = 1.37 mm - Tolerance_Tight"
equation "d64 = 1.45 mm - Tolerance_Tight"
equation "d65 = 15.72 mm + 2 * Tolerance_Tight"
equation "d66 = 2.02 mm - 2 * Tolerance_Tight"
equation "d67 = 20.85 mm + 2 * Tolerance_Tight"
equation "d68 = d59"
equation "d69 = 1.33 mm - Tolerance_Tight"
